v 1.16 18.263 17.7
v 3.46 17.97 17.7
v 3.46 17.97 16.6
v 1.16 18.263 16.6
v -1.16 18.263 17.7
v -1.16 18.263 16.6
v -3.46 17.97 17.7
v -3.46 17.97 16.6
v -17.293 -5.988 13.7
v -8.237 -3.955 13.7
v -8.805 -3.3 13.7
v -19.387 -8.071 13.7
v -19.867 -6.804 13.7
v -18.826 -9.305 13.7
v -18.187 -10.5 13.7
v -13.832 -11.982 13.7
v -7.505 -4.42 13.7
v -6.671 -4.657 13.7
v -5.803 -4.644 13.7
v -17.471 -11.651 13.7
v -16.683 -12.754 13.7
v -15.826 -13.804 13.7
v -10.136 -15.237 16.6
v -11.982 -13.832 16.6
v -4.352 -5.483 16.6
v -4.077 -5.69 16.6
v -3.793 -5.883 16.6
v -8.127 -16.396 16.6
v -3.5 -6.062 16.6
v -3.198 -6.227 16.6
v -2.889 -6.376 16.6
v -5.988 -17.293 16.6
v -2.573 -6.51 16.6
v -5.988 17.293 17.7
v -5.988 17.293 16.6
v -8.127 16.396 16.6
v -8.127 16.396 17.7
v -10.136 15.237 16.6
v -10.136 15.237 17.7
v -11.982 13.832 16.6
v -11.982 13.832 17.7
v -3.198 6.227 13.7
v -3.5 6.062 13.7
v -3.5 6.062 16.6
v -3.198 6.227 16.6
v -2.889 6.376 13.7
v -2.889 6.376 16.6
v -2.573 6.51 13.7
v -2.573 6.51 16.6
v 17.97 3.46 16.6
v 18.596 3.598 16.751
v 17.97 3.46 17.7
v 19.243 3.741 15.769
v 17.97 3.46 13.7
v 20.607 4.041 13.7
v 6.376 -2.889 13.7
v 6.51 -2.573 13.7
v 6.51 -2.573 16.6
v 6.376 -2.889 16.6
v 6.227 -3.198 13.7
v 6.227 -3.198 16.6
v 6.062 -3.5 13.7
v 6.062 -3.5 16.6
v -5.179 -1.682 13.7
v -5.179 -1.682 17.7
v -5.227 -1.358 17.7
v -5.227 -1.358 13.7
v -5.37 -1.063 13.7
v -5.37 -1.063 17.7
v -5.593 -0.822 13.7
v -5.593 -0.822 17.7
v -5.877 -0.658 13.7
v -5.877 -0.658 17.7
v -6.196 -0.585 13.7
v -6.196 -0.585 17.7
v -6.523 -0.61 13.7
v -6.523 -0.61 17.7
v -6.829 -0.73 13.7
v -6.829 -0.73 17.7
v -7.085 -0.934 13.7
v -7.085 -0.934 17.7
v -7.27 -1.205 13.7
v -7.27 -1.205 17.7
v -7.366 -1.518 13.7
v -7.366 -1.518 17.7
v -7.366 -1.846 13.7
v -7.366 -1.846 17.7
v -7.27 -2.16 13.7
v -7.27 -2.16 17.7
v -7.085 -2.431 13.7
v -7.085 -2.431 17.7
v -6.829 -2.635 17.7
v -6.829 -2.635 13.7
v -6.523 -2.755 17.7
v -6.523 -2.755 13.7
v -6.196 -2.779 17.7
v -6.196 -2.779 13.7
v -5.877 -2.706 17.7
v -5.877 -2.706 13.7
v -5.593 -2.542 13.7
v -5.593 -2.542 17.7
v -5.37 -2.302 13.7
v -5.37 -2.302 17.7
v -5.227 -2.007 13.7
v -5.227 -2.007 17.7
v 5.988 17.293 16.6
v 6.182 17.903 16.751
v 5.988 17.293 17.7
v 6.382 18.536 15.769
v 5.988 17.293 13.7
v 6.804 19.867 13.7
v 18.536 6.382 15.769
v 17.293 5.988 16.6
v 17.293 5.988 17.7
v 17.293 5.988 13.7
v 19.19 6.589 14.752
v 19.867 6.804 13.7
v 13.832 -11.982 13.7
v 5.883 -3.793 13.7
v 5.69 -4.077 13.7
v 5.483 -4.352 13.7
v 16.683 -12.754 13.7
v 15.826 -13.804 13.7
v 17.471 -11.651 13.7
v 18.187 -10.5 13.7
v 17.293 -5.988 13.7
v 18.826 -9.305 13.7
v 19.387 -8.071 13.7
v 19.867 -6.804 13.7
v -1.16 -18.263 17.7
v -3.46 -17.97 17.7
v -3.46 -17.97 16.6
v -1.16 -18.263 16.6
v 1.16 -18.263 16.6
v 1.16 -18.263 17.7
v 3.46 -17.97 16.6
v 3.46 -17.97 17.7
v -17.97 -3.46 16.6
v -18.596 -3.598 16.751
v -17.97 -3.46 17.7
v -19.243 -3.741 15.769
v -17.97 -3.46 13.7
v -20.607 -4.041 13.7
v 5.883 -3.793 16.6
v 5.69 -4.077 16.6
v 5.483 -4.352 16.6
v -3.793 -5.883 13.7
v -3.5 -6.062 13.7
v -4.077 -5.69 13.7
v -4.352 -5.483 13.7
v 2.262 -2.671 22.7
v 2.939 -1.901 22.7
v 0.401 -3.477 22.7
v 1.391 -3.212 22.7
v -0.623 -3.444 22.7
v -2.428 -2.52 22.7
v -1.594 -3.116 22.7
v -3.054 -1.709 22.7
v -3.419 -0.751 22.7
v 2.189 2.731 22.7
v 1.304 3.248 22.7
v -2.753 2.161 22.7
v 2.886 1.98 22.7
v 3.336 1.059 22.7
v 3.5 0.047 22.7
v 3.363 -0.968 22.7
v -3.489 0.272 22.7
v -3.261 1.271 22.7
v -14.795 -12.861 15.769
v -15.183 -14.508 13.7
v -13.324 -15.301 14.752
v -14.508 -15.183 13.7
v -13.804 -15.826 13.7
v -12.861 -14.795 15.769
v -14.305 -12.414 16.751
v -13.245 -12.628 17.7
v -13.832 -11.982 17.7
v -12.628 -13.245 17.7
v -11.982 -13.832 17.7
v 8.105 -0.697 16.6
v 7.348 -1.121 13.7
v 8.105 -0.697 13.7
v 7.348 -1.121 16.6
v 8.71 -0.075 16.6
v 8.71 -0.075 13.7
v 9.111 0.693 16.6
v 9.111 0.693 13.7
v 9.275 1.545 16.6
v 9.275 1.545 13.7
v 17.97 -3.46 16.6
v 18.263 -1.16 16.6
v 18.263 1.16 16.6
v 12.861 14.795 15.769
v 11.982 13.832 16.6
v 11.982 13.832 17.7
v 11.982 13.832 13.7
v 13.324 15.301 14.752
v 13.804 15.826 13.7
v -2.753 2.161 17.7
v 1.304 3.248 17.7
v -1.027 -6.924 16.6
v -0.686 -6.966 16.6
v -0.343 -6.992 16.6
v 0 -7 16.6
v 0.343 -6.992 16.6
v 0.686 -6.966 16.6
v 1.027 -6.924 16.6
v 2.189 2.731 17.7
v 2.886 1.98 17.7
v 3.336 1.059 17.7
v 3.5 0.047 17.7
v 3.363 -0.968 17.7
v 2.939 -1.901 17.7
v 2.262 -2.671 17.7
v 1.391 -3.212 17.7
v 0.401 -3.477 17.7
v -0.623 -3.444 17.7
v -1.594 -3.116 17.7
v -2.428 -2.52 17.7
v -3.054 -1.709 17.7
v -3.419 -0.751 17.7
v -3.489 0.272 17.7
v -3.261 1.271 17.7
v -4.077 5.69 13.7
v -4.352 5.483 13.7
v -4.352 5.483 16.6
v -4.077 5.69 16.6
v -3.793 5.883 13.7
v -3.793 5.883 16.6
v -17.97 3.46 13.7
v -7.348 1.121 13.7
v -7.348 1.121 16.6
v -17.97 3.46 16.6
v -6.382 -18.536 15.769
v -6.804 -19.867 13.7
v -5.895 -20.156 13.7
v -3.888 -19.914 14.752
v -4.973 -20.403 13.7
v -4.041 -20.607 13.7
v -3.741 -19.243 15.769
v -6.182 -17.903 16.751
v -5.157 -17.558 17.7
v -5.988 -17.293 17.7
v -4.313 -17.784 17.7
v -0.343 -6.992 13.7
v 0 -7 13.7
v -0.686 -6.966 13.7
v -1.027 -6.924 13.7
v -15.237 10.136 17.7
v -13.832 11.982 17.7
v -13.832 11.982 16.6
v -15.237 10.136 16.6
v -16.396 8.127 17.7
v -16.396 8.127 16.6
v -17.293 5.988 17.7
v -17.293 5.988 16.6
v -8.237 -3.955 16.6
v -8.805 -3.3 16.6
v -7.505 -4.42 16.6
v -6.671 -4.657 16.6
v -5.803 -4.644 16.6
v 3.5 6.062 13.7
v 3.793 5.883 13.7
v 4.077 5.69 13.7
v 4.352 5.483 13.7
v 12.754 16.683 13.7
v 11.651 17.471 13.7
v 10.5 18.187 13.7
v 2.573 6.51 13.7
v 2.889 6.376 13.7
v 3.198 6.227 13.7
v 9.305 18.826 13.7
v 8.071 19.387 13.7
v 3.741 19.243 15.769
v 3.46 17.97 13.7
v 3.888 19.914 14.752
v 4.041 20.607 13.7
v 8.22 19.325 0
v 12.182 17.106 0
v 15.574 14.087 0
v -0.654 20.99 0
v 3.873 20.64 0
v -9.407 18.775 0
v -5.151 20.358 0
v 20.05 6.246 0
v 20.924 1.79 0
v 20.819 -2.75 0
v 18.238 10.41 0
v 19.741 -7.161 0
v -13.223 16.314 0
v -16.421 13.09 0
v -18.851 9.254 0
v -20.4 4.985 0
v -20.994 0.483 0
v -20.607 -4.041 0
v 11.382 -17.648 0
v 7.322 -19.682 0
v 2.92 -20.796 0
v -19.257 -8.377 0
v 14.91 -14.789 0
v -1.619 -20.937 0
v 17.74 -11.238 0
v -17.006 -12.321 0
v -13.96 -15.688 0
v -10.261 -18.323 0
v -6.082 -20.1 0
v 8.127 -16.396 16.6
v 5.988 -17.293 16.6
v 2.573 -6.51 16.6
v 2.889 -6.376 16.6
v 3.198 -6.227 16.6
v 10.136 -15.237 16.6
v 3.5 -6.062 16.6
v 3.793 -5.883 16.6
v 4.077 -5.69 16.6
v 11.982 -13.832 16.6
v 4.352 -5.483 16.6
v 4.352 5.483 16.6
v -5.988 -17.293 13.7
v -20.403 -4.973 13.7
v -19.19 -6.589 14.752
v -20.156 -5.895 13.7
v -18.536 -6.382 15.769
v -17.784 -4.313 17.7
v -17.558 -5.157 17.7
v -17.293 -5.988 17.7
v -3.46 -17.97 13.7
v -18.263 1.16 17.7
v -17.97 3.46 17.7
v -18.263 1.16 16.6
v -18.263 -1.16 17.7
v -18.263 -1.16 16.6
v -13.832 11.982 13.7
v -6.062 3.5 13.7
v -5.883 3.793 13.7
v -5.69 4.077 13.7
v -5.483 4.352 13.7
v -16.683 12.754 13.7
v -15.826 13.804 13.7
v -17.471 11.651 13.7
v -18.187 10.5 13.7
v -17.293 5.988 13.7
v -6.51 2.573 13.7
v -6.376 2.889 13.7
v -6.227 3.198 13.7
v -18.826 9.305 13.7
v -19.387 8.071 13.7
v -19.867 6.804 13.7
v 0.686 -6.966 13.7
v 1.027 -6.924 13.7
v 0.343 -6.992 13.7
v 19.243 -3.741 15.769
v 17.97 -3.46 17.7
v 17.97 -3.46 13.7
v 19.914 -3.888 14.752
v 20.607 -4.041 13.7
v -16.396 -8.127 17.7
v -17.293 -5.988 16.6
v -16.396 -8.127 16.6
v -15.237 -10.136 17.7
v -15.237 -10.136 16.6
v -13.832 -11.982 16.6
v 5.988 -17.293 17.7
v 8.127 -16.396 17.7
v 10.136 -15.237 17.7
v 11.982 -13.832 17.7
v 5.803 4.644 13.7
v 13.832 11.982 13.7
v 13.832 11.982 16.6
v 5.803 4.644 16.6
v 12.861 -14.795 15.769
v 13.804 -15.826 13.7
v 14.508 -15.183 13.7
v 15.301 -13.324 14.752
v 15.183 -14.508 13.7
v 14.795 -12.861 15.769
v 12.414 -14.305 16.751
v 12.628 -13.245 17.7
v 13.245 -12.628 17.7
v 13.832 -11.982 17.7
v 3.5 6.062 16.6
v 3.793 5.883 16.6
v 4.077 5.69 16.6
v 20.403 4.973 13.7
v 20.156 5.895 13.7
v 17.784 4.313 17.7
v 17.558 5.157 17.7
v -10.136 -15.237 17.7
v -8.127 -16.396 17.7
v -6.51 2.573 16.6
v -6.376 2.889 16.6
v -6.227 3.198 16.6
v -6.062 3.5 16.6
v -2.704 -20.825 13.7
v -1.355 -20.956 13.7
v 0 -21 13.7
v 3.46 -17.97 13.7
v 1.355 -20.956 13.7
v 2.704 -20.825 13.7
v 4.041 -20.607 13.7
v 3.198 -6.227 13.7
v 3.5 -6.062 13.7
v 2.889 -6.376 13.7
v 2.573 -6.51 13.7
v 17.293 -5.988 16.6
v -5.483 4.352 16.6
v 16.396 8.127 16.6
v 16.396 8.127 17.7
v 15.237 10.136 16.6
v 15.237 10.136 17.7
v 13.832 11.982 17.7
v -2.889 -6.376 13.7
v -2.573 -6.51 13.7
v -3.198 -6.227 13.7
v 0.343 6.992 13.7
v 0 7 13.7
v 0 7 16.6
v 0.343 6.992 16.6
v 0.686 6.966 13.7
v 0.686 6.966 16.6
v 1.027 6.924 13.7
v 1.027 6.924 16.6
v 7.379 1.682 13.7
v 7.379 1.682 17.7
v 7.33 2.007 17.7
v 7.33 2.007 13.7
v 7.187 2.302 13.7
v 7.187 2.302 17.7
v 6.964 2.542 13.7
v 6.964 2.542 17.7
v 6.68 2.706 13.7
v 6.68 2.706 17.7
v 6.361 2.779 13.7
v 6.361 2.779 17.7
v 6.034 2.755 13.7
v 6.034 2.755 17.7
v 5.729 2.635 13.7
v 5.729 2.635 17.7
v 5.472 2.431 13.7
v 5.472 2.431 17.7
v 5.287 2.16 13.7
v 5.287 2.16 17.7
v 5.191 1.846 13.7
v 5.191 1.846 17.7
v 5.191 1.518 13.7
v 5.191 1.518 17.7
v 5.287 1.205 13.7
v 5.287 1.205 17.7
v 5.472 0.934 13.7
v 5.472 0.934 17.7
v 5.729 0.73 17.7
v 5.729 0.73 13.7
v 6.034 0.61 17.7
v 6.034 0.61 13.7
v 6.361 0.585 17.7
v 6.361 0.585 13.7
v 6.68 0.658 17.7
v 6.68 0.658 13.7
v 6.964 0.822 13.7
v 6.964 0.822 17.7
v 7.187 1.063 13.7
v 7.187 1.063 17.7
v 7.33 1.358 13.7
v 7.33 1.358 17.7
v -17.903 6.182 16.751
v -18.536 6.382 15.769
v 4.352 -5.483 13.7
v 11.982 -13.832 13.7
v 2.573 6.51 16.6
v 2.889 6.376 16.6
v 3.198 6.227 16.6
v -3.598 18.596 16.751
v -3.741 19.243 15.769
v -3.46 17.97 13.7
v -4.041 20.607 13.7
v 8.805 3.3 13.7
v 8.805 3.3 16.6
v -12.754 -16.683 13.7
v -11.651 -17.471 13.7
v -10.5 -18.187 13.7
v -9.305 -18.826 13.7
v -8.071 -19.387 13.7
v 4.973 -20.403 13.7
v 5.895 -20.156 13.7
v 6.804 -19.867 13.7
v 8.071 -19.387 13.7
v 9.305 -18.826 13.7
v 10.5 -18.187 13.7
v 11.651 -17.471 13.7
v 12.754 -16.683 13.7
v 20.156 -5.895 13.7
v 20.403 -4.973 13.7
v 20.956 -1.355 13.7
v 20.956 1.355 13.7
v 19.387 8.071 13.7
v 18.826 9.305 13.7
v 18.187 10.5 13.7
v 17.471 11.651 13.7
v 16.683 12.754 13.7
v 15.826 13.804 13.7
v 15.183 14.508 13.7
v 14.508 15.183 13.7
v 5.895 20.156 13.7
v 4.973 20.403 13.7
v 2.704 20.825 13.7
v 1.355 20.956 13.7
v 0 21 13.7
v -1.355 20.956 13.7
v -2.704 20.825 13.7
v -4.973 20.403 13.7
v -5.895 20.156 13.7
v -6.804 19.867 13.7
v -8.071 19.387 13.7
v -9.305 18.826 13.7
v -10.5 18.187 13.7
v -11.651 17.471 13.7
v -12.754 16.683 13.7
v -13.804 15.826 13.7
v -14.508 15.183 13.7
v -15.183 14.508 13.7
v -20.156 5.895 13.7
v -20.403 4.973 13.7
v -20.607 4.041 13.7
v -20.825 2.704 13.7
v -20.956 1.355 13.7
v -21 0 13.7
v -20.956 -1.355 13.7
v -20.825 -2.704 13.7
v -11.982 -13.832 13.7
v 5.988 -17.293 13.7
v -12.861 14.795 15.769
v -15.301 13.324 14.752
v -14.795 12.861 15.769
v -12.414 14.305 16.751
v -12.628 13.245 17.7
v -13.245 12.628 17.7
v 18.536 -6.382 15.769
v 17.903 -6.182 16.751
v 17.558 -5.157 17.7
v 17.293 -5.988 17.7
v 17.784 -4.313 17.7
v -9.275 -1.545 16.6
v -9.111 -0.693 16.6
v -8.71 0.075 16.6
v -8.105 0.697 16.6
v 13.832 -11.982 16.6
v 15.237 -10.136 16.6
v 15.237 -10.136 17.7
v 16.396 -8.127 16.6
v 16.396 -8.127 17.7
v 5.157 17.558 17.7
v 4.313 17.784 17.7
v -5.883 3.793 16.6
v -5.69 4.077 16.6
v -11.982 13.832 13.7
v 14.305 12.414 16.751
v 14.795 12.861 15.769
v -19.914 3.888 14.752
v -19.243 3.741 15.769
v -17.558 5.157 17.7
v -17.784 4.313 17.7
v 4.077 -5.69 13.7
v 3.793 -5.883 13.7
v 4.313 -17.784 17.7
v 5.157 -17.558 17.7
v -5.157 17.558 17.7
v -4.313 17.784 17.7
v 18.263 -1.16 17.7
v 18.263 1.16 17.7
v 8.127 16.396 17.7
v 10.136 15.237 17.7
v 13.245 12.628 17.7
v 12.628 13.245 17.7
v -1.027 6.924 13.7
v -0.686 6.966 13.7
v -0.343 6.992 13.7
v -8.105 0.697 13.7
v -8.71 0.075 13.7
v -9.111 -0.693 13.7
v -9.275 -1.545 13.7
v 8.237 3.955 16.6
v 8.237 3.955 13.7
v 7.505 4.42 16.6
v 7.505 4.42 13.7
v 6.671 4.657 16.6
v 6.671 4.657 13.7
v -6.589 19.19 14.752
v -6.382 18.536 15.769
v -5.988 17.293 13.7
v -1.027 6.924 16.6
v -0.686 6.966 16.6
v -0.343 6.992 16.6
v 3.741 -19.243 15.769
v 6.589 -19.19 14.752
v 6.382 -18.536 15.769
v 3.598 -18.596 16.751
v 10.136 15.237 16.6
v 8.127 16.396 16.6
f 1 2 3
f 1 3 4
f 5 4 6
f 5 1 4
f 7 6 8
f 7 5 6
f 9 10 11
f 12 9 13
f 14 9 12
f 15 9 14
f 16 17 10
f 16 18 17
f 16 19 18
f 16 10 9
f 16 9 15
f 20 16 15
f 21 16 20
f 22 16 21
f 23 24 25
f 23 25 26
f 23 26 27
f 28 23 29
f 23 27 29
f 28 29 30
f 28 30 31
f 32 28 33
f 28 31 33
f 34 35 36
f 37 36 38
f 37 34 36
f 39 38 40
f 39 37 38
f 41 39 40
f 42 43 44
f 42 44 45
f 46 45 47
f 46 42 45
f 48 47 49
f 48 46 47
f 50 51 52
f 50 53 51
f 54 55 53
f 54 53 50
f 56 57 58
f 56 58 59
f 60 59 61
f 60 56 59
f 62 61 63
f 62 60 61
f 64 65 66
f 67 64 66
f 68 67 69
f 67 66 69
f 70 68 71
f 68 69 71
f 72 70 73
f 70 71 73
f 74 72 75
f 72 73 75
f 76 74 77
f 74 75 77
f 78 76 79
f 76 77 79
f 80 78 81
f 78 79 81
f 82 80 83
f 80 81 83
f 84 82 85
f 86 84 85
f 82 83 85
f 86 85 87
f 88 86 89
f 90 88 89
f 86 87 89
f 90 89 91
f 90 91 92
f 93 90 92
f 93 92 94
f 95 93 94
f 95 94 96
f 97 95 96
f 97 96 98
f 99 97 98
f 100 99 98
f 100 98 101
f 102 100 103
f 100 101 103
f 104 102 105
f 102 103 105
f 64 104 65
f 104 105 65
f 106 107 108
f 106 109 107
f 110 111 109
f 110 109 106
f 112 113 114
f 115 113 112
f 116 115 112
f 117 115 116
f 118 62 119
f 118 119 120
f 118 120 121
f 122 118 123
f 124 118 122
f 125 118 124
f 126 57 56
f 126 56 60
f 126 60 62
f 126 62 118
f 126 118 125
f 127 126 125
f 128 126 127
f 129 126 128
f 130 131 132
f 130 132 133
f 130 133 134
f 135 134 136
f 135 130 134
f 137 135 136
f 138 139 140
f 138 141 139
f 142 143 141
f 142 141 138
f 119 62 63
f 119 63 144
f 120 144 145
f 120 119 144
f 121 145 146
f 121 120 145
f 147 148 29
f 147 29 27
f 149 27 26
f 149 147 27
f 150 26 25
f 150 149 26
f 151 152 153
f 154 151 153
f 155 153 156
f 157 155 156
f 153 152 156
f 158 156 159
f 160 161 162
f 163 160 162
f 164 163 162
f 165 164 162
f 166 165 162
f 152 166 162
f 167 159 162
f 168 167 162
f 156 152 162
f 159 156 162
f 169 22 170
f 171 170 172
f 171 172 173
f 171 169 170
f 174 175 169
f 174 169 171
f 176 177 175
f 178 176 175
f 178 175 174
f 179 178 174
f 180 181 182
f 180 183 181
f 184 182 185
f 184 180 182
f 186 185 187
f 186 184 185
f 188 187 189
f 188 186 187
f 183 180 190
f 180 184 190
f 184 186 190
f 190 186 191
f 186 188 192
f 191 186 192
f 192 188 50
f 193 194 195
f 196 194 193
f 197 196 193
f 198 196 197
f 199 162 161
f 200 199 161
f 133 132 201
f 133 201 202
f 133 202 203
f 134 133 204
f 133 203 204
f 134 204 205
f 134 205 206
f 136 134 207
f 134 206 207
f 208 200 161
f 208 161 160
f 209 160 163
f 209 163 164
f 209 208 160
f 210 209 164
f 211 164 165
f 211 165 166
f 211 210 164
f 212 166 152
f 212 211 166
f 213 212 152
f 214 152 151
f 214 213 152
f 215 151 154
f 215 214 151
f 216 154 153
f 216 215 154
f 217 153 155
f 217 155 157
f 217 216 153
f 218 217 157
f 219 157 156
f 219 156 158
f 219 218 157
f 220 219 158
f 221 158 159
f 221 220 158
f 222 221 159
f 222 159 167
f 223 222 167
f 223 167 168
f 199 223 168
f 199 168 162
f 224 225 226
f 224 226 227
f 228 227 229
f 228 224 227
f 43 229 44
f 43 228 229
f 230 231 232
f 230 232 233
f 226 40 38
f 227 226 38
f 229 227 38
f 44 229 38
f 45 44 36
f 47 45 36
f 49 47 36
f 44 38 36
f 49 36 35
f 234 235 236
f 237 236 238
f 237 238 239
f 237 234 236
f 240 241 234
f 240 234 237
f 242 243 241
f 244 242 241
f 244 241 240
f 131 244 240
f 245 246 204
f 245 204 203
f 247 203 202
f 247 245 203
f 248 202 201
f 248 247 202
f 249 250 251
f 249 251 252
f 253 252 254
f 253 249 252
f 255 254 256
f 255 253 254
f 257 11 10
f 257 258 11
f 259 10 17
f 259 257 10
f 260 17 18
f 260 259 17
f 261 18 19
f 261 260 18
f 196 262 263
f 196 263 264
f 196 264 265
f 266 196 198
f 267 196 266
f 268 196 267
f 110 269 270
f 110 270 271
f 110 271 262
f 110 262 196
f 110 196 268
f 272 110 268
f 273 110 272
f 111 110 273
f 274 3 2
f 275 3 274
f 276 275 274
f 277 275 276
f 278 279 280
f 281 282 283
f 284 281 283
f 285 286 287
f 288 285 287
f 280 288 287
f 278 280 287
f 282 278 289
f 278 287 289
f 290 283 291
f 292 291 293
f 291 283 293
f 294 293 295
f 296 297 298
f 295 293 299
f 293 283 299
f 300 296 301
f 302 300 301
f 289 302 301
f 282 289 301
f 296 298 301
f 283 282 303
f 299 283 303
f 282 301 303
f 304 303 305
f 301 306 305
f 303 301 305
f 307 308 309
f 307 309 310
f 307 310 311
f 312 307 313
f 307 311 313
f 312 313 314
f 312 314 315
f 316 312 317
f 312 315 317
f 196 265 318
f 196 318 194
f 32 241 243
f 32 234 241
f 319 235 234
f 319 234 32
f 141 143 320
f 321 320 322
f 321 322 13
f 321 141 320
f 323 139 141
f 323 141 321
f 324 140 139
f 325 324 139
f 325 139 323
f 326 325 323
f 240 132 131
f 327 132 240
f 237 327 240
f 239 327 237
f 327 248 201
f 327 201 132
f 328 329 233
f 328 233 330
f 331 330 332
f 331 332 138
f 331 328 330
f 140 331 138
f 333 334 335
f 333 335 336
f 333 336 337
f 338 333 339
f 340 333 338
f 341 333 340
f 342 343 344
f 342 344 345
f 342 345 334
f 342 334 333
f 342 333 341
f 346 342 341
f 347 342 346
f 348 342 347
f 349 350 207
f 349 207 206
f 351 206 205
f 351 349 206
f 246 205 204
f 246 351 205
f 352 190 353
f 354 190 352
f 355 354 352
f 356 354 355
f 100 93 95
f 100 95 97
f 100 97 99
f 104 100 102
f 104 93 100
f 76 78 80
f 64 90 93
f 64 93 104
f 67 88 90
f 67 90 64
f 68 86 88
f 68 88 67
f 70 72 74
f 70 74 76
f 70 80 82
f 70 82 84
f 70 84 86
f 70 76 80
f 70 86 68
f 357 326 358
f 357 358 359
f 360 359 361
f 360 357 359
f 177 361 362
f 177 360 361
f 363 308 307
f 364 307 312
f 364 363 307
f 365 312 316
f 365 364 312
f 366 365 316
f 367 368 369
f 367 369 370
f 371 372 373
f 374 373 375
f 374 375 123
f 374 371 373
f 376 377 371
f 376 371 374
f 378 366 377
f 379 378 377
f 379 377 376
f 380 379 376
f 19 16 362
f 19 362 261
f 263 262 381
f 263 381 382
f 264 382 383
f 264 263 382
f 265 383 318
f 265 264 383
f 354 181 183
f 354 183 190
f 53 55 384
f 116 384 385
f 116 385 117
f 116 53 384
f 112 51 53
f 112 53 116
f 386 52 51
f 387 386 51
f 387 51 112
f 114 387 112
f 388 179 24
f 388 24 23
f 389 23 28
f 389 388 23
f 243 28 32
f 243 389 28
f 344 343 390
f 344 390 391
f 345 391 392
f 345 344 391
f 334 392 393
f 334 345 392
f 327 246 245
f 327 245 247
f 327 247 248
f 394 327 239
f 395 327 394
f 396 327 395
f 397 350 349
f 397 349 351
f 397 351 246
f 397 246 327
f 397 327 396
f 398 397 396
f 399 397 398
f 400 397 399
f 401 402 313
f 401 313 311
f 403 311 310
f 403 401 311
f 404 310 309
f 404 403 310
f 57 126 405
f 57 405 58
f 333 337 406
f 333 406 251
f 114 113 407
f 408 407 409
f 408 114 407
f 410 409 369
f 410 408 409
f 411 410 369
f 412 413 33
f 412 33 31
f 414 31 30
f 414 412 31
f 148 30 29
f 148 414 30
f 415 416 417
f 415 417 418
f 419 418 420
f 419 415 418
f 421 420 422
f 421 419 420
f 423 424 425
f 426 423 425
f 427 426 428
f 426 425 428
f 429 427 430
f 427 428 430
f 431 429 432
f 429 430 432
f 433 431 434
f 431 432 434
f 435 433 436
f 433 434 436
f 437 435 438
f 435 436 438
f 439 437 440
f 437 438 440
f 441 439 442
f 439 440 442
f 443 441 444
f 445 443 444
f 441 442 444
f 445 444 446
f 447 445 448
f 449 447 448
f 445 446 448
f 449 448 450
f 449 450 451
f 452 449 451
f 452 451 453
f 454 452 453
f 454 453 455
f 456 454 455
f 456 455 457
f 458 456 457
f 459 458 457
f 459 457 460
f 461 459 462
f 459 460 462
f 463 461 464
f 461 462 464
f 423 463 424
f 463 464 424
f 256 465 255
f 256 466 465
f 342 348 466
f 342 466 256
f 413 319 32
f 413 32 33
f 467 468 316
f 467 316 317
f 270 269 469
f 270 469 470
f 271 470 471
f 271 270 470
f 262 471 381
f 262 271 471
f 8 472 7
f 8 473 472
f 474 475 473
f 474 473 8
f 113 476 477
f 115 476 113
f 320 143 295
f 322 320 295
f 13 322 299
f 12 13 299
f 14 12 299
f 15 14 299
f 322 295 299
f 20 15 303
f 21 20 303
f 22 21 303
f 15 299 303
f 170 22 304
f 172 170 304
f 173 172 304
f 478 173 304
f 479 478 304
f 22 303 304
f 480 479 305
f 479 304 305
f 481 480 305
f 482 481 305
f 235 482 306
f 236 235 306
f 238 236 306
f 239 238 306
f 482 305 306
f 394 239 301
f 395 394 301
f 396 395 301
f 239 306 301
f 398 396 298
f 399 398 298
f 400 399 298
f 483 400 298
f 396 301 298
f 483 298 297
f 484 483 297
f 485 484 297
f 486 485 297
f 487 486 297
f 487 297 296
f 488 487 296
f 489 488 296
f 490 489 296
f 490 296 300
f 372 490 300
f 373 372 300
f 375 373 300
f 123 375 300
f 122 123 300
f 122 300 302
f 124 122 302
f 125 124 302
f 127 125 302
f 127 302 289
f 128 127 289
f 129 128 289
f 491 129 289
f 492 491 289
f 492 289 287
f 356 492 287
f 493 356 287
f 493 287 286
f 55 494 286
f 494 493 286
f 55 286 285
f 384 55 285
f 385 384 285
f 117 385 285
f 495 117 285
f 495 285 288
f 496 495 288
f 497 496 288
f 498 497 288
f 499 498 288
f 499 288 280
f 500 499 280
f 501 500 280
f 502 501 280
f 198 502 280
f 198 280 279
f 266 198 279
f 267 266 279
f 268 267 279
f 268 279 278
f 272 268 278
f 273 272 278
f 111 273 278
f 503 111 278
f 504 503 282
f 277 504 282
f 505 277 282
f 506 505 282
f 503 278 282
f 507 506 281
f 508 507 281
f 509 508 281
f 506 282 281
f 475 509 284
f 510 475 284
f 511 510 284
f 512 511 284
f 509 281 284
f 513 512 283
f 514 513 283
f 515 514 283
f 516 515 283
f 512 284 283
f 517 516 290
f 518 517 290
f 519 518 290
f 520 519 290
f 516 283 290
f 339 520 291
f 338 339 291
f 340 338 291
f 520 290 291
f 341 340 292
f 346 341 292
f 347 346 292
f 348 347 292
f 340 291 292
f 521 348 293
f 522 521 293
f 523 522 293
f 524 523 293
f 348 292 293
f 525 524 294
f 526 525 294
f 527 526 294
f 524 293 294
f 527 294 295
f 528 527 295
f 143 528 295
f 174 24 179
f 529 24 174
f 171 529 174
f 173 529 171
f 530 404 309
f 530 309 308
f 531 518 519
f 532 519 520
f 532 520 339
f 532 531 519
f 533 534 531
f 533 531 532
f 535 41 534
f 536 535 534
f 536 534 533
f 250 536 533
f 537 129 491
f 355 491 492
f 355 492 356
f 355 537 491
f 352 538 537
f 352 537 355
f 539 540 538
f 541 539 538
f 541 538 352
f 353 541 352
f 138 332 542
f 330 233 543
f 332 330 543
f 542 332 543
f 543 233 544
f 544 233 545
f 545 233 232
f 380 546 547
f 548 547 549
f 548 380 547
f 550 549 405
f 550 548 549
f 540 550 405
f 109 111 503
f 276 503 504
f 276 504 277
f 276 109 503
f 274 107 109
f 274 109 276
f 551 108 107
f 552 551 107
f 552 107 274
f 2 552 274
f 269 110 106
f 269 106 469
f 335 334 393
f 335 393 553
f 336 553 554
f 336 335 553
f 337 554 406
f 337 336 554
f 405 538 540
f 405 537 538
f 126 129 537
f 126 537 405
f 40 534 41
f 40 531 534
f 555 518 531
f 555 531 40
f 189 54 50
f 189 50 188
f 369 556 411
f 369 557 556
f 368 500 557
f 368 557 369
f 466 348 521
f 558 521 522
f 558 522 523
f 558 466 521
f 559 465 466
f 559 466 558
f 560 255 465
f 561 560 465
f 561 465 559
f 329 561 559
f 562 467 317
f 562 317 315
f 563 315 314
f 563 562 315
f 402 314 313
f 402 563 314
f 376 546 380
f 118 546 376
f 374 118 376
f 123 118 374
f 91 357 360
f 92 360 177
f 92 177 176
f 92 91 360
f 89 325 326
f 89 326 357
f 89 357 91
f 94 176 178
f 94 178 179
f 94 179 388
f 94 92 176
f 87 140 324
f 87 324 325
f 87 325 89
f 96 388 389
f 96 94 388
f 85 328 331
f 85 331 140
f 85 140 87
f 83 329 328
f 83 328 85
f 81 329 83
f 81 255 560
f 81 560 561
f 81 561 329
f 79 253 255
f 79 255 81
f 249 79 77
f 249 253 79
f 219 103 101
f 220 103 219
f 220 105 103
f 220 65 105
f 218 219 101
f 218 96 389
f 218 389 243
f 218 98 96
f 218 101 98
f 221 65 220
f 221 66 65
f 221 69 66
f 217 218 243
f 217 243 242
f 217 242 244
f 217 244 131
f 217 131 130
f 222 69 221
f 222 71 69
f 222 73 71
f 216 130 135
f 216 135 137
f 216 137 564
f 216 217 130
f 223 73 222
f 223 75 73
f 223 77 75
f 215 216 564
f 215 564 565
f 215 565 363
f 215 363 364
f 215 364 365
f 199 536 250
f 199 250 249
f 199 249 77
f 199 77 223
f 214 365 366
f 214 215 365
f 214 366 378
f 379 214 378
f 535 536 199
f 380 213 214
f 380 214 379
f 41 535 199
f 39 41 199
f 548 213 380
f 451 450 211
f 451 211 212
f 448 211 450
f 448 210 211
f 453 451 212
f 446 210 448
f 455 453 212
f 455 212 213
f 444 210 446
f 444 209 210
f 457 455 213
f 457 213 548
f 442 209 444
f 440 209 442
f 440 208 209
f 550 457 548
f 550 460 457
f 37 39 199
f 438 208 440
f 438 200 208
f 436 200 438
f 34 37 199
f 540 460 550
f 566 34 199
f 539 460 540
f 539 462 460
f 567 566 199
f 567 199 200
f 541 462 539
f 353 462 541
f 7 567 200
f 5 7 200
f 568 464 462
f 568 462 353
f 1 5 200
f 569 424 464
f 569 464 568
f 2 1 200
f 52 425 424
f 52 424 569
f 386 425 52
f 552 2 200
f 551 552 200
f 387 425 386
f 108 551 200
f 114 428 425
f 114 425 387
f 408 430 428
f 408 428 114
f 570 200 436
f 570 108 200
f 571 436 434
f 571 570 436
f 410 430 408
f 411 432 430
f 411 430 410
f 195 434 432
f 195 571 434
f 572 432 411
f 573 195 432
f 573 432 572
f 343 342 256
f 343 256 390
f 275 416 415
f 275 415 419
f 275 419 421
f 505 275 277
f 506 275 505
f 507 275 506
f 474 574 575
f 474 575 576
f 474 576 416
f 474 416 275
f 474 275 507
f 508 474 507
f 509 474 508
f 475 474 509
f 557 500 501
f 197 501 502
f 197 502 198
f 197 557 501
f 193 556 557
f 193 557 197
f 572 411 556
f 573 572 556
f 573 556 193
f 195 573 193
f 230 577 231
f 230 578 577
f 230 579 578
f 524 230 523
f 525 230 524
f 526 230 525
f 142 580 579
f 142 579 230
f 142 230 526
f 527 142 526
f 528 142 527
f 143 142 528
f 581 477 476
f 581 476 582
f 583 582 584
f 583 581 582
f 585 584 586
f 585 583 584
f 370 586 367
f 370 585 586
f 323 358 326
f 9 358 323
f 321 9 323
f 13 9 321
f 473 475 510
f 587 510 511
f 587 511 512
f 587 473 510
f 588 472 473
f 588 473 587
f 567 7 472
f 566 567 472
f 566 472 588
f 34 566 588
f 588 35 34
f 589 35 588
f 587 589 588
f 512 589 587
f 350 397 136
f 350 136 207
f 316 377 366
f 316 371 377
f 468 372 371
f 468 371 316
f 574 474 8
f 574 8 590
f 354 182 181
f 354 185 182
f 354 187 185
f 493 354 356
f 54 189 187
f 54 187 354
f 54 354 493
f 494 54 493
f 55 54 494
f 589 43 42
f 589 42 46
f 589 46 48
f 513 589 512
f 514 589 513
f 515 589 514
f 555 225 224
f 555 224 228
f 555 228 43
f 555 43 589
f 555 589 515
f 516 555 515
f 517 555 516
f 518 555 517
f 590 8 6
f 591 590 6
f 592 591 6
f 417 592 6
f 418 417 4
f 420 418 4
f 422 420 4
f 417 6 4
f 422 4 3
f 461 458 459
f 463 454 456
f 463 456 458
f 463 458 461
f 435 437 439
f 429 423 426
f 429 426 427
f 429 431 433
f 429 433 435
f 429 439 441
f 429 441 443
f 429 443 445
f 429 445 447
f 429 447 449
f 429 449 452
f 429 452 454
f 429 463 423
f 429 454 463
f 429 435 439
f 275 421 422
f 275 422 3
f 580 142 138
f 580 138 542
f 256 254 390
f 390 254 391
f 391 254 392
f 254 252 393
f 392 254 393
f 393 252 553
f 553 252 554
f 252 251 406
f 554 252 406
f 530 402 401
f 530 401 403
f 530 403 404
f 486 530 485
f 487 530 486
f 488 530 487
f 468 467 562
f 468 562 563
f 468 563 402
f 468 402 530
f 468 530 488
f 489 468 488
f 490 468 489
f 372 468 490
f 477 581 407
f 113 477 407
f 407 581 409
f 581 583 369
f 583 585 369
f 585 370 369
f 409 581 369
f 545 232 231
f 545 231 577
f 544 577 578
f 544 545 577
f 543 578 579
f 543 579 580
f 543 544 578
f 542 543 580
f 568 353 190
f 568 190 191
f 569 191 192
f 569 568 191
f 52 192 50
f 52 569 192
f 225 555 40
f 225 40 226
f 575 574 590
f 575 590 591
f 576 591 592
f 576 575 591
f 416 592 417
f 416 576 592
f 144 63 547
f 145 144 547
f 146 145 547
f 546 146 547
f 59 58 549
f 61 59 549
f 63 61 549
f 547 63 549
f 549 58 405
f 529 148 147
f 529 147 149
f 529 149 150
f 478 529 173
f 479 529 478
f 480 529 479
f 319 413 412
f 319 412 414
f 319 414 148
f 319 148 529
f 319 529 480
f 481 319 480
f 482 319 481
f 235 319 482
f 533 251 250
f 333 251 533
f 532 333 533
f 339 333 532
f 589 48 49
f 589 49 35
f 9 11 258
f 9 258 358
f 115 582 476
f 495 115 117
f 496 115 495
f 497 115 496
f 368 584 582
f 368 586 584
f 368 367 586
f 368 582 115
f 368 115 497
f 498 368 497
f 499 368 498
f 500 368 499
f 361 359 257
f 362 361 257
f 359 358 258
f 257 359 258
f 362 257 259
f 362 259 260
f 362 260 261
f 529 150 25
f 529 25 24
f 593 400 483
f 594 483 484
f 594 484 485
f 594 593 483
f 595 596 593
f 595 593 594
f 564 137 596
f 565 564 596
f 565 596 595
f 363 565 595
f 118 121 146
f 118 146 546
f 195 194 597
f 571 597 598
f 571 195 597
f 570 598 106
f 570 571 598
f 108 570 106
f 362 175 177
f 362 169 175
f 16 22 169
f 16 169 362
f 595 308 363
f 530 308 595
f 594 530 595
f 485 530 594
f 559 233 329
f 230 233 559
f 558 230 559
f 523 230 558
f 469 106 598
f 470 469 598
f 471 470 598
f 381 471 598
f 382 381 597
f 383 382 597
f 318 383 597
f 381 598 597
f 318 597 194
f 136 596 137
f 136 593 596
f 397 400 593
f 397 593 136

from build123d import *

# Parameters (mm, degrees)
SKETCH_1_R               = 21
EXTRUDE_1_DEPTH          = 13.7
SKETCH_3_R               = 21
SKETCH_2_R               = 18.3
CUT_EXTRUDE_START        = -4
CUT_EXTRUDE_1_DEPTH      = 4
PATTERN_CIRCULAR_1_COUNT = 12
SKETCH_5_R               = 18.3
EXTRUDE_2_DEPTH          = 1.1
EXTRUDE_3_DEPTH          = 5
SKETCH_8_R               = 3
EXTRUDE_4_DEPTH          = 4
SKETCH_9_R               = 1.1
CUT_EXTRUDE_3_DEPTH      = 4


with BuildPart() as part:
    # 草图1 → 凸台-拉伸1 (new body)
    with BuildSketch(Plane.XY):
        with Locations(Location((0, 0, 0), (0, 0, 191.095408705))):
            Circle(SKETCH_1_R)
    extrude(amount=EXTRUDE_1_DEPTH)

    # 草图3 → 放样1 section 0
    with BuildSketch(Plane.XY.offset(13.7)):
        Circle(SKETCH_3_R)
    # 草图2 → 放样1 section 1
    with BuildSketch(Plane.XY.offset(17.7)):
        Circle(SKETCH_2_R)
    loft()

    # 草图4 → 切除-拉伸1 (cut)
    with BuildSketch(Plane.XY.offset(17.7).offset(CUT_EXTRUDE_START)):
        with BuildLine():
            ThreePointArc((6.924234277, 1.027122038), (6.981032873, 0.51495634), (7, 0))
            Line((7, 0), (18.3, 0))
            ThreePointArc((18.3, 0), (18.217281615, 1.738001882), (17.969874258, 3.460291774))
            Line((17.969874258, 3.460291774), (6.924234277, 1.027122038))
        make_face()
        with BuildLine():
            Line((18.3, 0), (7, 0))
            ThreePointArc((7, 0), (6.981032873, -0.51495634), (6.924234277, -1.027122038))
            Line((6.924234277, -1.027122038), (17.969874258, -3.460291774))
            ThreePointArc((17.969874258, -3.460291774), (18.217281615, -1.738001882), (18.3, 0))
        make_face()
        with BuildLine():
            ThreePointArc((17.969874258, 3.460291774), (18.217281615, 1.738001882), (18.3, 0))
            Line((18.3, 0), (21, 0))
            ThreePointArc((21, 0), (20.9016371, 2.030164166), (20.607469853, 4.041309967))
            Line((20.607469853, 4.041309967), (17.969874258, 3.460291774))
        make_face()
        with BuildLine():
            Line((21, 0), (18.3, 0))
            ThreePointArc((18.3, 0), (18.217281615, -1.738001882), (17.969874258, -3.460291774))
            Line((17.969874258, -3.460291774), (20.607469853, -4.041309967))
            ThreePointArc((20.607469853, -4.041309967), (20.9016371, -2.030164166), (21, 0))
        make_face()
    cut_extrude_1 = extrude(amount=CUT_EXTRUDE_1_DEPTH, mode=Mode.SUBTRACT)

    # 阵列(圆周)1: 切除-拉伸1 ×12 about axis
    pattern_circular_1_axis = Axis((0, 0, 0), (0, 0, -1))
    for i in range(1, PATTERN_CIRCULAR_1_COUNT):
        add(cut_extrude_1.rotate(pattern_circular_1_axis, i * 360 / PATTERN_CIRCULAR_1_COUNT), mode=Mode.SUBTRACT)

    # 草图5 → 凸台-拉伸2 (add)
    with BuildSketch(Plane.XY.offset(17.7)):
        Circle(SKETCH_5_R)
    extrude(amount=-EXTRUDE_2_DEPTH)

    # 草图6 → 凸台-拉伸3 (add)
    with BuildSketch(Plane.XY.offset(17.7)):
        with BuildLine():
            Line((-2.753137561, 2.161072319), (1.303750909, 3.248112308))
            ThreePointArc((1.303750909, 3.248112308), (0.905866658, -3.380740392), (-2.753137561, 2.161072319))
        make_face()
    extrude(amount=EXTRUDE_3_DEPTH)

    # 草图8 → 凸台-拉伸4 (add)
    with BuildSketch(Plane.XY.offset(17.7)):
        with Locations((6.278517871, 1.682323793)):
            Circle(SKETCH_8_R)
        with Locations((-6.278517871, -1.682323793)):
            Circle(SKETCH_8_R)
    extrude(amount=-EXTRUDE_4_DEPTH)

    # 草图9 → 切除-拉伸3 (cut)
    with BuildSketch(Plane.XY.offset(17.7)):
        with Locations((6.278517871, 1.682323793)):
            Circle(SKETCH_9_R)
        with Locations((-6.278517871, -1.682323793)):
            Circle(SKETCH_9_R)
    extrude(amount=-CUT_EXTRUDE_3_DEPTH, mode=Mode.SUBTRACT)


solid = part.part
